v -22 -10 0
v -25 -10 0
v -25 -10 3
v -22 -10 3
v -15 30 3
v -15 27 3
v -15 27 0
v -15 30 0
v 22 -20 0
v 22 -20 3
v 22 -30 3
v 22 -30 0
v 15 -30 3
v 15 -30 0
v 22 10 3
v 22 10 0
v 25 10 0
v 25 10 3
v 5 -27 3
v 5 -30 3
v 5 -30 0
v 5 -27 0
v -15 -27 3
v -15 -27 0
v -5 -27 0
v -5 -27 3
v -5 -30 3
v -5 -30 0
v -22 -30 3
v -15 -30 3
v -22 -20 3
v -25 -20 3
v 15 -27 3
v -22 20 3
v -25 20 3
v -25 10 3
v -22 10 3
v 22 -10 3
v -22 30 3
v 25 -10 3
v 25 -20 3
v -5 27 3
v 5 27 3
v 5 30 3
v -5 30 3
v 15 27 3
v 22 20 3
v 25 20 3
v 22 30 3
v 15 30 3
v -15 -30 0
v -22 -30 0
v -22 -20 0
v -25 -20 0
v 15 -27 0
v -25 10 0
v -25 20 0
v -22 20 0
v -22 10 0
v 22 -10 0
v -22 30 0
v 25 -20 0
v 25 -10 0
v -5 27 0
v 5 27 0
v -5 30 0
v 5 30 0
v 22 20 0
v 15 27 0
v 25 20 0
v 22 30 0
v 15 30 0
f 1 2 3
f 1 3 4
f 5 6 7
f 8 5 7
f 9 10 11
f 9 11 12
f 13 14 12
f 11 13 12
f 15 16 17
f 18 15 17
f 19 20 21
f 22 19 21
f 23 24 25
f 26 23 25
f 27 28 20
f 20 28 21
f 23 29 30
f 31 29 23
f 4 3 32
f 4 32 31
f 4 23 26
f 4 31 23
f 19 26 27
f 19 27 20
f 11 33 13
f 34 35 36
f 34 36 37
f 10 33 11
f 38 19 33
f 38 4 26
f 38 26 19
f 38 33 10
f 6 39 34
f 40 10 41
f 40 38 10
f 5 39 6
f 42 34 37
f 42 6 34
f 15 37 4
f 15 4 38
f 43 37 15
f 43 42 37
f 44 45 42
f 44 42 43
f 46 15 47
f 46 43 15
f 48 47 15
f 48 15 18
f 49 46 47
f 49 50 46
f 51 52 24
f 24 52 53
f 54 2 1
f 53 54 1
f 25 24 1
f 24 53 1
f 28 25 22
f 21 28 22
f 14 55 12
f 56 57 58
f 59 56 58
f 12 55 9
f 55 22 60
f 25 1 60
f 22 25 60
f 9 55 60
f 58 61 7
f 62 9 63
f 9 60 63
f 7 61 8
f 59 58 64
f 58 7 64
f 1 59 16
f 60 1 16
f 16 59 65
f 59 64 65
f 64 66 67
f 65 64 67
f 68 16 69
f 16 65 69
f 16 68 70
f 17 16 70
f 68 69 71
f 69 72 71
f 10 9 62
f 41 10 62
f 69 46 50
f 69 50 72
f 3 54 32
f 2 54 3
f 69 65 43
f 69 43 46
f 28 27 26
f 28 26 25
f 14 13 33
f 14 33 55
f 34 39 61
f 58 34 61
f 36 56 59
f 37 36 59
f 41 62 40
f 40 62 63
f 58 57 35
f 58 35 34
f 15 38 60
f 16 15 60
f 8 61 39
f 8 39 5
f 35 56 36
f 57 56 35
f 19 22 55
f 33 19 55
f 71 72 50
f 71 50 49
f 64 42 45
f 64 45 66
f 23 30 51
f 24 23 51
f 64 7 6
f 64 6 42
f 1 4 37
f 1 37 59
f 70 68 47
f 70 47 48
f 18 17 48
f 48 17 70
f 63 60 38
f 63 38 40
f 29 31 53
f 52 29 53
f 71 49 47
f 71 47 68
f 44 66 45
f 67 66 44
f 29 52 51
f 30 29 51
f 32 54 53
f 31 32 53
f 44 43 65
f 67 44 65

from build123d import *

# Parameters (mm, degrees)
SKETCH1_W             = 50
SKETCH1_H             = 60
BOSS_EXTRUDE1_DEPTH   = 3
CAVITY8_START         = -10
CAVITY8_OUTLINE_W     = 3
CAVITY8_OUTLINE_H     = 3
CAVITY8_DEPTH         = 20
CAVITY8_START_2       = -30
CAVITY8_2_OUTLINE_W   = 10
CAVITY8_2_OUTLINE_H   = 3
CAVITY8_2_OUTLINE_W_2 = 3
CAVITY8_2_DEPTH       = 3
CAVITY8_START_3       = 27
CAVITY8_3_OUTLINE_W   = 10
CAVITY8_3_OUTLINE_H   = 3
CAVITY8_3_OUTLINE_W_2 = 3
CAVITY8_3_DEPTH       = 3
CAVITY8_START_4       = -27
CAVITY8_4_OUTLINE_W   = 3
CAVITY8_4_OUTLINE_H   = 3
CAVITY8_4_DEPTH       = 7
CAVITY8_START_5       = 20
CAVITY8_5_OUTLINE_W   = 3
CAVITY8_5_OUTLINE_H   = 3
CAVITY8_5_DEPTH       = 7


# Read off the part's stored shape, not the designer's step: Cavity8
with BuildPart() as part:
    # Sketch1 → Boss-Extrude1 (new body)
    with BuildSketch(Plane.XY):
        Rectangle(SKETCH1_W, SKETCH1_H)
    extrude(amount=BOSS_EXTRUDE1_DEPTH)

    # Cavity8 outline → Cavity8 (cut)
    with BuildSketch(Plane(origin=(0, 0, 0), x_dir=(1, 0, 0), z_dir=(0, 1, 0)).offset(CAVITY8_START)):
        with Locations((23.5, -1.5)):
            Rectangle(CAVITY8_OUTLINE_W, CAVITY8_OUTLINE_H)
        with Locations((-23.5, -1.5)):
            Rectangle(CAVITY8_OUTLINE_W, CAVITY8_OUTLINE_H)
    extrude(amount=CAVITY8_DEPTH, mode=Mode.SUBTRACT)

    # Cavity8 2 outline → Cavity8 2 (cut)
    with BuildSketch(Plane(origin=(0, 0, 0), x_dir=(1, 0, 0), z_dir=(0, 1, 0)).offset(CAVITY8_START_2)):
        with Locations((10, -1.5)):
            Rectangle(CAVITY8_2_OUTLINE_W, CAVITY8_2_OUTLINE_H)
        with Locations((-10, -1.5)):
            Rectangle(CAVITY8_2_OUTLINE_W, CAVITY8_2_OUTLINE_H)
        with Locations((23.5, -1.5)):
            Rectangle(CAVITY8_2_OUTLINE_W_2, CAVITY8_2_OUTLINE_H)
        with Locations((-23.5, -1.5)):
            Rectangle(CAVITY8_2_OUTLINE_W_2, CAVITY8_2_OUTLINE_H)
    extrude(amount=CAVITY8_2_DEPTH, mode=Mode.SUBTRACT)

    # Cavity8 3 outline → Cavity8 3 (cut)
    with BuildSketch(Plane(origin=(0, 0, 0), x_dir=(1, 0, 0), z_dir=(0, 1, 0)).offset(CAVITY8_START_3)):
        with Locations((10, -1.5)):
            Rectangle(CAVITY8_3_OUTLINE_W, CAVITY8_3_OUTLINE_H)
        with Locations((-10, -1.5)):
            Rectangle(CAVITY8_3_OUTLINE_W, CAVITY8_3_OUTLINE_H)
        with Locations((23.5, -1.5)):
            Rectangle(CAVITY8_3_OUTLINE_W_2, CAVITY8_3_OUTLINE_H)
        with Locations((-23.5, -1.5)):
            Rectangle(CAVITY8_3_OUTLINE_W_2, CAVITY8_3_OUTLINE_H)
    extrude(amount=CAVITY8_3_DEPTH, mode=Mode.SUBTRACT)

    # Cavity8 4 outline → Cavity8 4 (cut)
    with BuildSketch(Plane(origin=(0, 0, 0), x_dir=(1, 0, 0), z_dir=(0, 1, 0)).offset(CAVITY8_START_4)):
        with Locations((23.5, -1.5)):
            Rectangle(CAVITY8_4_OUTLINE_W, CAVITY8_4_OUTLINE_H)
        with Locations((-23.5, -1.5)):
            Rectangle(CAVITY8_4_OUTLINE_W, CAVITY8_4_OUTLINE_H)
    extrude(amount=CAVITY8_4_DEPTH, mode=Mode.SUBTRACT)

    # Cavity8 5 outline → Cavity8 5 (cut)
    with BuildSketch(Plane(origin=(0, 0, 0), x_dir=(1, 0, 0), z_dir=(0, 1, 0)).offset(CAVITY8_START_5)):
        with Locations((23.5, -1.5)):
            Rectangle(CAVITY8_5_OUTLINE_W, CAVITY8_5_OUTLINE_H)
        with Locations((-23.5, -1.5)):
            Rectangle(CAVITY8_5_OUTLINE_W, CAVITY8_5_OUTLINE_H)
    extrude(amount=CAVITY8_5_DEPTH, mode=Mode.SUBTRACT)


solid = part.part
